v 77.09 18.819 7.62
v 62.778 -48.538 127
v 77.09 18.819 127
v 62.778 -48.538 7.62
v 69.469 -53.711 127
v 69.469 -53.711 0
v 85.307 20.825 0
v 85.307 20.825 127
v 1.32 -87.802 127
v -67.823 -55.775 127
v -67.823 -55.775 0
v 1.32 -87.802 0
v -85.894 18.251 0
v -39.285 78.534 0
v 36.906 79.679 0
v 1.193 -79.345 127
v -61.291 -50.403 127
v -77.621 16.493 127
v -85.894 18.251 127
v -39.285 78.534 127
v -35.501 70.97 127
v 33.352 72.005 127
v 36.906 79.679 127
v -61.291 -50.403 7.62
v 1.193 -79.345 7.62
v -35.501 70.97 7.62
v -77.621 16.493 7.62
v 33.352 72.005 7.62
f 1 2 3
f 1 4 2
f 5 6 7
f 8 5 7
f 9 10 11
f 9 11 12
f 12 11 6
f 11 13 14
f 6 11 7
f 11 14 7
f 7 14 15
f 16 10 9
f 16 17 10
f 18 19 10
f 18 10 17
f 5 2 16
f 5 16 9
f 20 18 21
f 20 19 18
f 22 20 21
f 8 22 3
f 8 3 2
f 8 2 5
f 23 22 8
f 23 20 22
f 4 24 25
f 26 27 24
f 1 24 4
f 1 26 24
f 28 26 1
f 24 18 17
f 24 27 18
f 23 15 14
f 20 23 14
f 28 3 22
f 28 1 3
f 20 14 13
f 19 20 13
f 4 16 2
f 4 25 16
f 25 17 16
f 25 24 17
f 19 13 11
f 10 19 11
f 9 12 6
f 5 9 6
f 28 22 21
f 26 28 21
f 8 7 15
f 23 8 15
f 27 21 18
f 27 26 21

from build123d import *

# Parameters (mm, degrees)
F1_DEPTH = 127
F2_T     = -7.62


with BuildPart() as f1:
    # F0 (on Top) → F1 (new body)
    with BuildSketch(Plane.XY):
        Polygon((-39.284959, 78.533807), (-85.893974, 18.25081), (-67.823074, -55.775419), (1.319984, -87.80162), (69.469067, -53.71141), (85.306526, 20.824587), (36.906431, 79.679246), align=None)
    extrude(amount=F1_DEPTH)

    # F2
    f2_openings = [f1.faces().sort_by_distance(p)[0] for p in [
        (0, 0, 127),
    ]]
    offset(amount=F2_T, openings=f2_openings)


solid = f1.part
